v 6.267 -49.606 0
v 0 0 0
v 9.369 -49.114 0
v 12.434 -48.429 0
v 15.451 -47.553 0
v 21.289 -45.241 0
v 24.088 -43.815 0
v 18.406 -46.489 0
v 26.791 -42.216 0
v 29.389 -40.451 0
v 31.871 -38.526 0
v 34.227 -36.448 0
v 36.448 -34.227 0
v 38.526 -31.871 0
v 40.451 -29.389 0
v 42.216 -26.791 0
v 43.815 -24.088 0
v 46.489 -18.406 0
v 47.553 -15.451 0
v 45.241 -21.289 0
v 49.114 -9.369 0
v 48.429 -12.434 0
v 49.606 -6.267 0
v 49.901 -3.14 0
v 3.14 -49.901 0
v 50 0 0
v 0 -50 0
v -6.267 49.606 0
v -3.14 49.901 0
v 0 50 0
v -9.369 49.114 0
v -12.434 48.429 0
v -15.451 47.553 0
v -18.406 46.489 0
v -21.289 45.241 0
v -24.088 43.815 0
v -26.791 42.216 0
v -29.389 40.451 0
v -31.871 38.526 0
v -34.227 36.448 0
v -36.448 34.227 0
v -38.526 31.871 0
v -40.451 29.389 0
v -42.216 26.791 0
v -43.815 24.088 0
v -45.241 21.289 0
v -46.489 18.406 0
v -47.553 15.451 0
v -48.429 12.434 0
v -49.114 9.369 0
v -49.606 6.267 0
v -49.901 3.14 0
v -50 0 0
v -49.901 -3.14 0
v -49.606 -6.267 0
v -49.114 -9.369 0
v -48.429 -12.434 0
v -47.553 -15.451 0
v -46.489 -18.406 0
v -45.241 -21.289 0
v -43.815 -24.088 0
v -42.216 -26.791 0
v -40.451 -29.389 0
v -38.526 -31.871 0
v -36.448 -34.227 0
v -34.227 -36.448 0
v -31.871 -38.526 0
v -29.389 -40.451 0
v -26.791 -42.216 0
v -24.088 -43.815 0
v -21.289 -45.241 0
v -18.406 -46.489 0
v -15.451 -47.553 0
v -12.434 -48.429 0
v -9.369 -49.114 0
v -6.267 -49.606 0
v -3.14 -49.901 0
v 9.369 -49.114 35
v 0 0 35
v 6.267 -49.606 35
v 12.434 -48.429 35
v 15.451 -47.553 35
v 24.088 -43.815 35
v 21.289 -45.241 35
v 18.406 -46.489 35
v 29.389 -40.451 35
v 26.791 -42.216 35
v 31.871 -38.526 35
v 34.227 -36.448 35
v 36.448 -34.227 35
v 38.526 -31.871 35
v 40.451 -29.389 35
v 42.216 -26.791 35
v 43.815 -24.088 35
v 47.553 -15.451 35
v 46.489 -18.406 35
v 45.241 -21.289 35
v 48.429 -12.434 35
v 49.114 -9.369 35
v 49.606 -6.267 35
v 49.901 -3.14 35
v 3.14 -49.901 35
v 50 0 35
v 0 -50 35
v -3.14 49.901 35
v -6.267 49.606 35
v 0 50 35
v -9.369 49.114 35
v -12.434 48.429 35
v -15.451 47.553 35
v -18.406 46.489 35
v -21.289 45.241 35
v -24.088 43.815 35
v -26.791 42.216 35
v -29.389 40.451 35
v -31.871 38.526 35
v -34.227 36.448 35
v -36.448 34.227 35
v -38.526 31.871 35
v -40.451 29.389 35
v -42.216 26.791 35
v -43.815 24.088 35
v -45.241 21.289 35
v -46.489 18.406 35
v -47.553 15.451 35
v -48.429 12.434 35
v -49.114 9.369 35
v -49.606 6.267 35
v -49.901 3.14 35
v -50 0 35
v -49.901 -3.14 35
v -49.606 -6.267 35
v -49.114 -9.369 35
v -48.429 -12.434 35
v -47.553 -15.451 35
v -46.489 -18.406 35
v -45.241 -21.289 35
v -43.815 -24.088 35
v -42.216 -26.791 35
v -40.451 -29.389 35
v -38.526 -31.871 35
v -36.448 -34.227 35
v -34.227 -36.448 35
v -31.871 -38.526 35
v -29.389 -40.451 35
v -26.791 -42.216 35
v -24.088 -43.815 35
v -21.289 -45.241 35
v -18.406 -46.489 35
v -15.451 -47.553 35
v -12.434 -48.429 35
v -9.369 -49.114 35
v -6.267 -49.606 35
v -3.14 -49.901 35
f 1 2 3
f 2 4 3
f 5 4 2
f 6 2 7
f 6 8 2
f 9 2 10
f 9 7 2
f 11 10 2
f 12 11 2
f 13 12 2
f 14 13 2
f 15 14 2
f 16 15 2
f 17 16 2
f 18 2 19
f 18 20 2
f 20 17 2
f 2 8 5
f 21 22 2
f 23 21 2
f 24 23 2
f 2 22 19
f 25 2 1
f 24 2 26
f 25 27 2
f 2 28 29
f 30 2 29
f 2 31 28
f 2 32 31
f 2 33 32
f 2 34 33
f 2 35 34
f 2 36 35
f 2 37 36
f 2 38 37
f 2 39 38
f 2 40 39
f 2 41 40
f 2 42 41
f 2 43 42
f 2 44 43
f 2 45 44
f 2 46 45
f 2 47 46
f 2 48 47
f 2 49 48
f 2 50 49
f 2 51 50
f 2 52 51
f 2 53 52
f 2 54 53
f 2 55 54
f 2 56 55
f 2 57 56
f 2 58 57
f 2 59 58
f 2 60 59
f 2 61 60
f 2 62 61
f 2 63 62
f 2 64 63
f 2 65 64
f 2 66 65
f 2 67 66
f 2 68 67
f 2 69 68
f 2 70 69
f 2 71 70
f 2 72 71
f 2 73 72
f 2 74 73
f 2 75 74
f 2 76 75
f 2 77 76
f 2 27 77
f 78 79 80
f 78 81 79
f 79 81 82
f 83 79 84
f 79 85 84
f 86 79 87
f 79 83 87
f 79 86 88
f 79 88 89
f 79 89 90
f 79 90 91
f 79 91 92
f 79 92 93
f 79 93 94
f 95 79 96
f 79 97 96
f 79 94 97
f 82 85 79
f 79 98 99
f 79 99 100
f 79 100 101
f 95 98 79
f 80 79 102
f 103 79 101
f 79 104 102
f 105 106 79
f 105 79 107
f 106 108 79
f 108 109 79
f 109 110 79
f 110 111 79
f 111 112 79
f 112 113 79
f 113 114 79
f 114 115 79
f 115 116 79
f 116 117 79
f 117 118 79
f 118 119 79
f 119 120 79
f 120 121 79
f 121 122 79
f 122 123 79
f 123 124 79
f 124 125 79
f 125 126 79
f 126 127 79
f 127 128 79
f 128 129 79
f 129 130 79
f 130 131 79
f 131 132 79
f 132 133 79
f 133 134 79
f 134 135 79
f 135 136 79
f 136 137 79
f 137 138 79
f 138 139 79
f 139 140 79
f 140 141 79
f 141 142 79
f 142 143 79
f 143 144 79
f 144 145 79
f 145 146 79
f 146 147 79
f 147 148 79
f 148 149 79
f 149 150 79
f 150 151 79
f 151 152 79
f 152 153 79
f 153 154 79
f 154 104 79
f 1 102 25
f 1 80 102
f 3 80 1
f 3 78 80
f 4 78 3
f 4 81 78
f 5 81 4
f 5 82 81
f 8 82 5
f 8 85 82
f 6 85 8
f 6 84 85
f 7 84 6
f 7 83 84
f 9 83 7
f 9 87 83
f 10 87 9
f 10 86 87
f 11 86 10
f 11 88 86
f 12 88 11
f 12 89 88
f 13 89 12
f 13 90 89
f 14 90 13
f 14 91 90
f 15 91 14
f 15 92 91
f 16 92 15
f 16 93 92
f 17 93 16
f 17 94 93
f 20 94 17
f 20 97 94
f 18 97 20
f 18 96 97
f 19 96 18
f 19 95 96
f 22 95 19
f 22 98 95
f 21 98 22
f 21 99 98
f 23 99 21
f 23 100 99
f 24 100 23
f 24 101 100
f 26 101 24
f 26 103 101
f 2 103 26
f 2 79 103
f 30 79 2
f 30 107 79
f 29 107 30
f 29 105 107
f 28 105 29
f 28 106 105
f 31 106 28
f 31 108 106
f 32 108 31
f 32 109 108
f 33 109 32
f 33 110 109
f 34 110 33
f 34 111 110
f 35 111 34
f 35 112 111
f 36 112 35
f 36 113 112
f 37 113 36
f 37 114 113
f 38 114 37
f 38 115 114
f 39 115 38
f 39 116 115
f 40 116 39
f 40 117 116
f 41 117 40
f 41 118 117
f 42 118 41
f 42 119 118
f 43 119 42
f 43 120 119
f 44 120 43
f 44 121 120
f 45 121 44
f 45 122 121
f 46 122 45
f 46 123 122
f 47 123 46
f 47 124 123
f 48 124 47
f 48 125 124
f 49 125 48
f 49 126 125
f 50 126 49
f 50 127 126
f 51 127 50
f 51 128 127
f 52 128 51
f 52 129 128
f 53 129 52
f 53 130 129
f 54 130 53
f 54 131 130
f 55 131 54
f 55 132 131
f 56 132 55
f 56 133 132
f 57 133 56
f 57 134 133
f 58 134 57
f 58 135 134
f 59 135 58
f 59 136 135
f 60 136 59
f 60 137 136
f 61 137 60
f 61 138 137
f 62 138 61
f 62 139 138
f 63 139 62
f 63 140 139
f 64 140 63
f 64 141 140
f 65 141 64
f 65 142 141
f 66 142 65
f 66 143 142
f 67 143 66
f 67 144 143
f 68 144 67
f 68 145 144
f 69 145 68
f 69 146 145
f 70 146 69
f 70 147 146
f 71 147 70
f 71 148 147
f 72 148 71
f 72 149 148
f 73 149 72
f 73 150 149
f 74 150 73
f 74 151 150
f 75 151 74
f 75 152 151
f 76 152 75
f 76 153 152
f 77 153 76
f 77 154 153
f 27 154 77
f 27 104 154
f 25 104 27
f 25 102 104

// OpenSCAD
// Açıyı $t parametresine göre hesapla
start_angle = $t * 360;  // 360 derece döngü

// Animasyonlu pizza kesimi
pizza_cut(diameter = 100, thickness = 35, start_angle = start_angle, end_angle = start_angle + 90);

module pizza_cut(diameter = 100, thickness = 35, start_angle = 0, end_angle = 45) {
    difference() {
        linear_extrude(height = thickness) {
            union() {
                difference() {
                    circle(d = diameter, $fn = 100);
                    polygon(points = [
                        [0, 0], 
                        [diameter * cos(start_angle), diameter * sin(start_angle)],
                        [diameter * cos(end_angle), diameter * sin(end_angle)]
                    ]);
                }
            }
        }
    }
}
